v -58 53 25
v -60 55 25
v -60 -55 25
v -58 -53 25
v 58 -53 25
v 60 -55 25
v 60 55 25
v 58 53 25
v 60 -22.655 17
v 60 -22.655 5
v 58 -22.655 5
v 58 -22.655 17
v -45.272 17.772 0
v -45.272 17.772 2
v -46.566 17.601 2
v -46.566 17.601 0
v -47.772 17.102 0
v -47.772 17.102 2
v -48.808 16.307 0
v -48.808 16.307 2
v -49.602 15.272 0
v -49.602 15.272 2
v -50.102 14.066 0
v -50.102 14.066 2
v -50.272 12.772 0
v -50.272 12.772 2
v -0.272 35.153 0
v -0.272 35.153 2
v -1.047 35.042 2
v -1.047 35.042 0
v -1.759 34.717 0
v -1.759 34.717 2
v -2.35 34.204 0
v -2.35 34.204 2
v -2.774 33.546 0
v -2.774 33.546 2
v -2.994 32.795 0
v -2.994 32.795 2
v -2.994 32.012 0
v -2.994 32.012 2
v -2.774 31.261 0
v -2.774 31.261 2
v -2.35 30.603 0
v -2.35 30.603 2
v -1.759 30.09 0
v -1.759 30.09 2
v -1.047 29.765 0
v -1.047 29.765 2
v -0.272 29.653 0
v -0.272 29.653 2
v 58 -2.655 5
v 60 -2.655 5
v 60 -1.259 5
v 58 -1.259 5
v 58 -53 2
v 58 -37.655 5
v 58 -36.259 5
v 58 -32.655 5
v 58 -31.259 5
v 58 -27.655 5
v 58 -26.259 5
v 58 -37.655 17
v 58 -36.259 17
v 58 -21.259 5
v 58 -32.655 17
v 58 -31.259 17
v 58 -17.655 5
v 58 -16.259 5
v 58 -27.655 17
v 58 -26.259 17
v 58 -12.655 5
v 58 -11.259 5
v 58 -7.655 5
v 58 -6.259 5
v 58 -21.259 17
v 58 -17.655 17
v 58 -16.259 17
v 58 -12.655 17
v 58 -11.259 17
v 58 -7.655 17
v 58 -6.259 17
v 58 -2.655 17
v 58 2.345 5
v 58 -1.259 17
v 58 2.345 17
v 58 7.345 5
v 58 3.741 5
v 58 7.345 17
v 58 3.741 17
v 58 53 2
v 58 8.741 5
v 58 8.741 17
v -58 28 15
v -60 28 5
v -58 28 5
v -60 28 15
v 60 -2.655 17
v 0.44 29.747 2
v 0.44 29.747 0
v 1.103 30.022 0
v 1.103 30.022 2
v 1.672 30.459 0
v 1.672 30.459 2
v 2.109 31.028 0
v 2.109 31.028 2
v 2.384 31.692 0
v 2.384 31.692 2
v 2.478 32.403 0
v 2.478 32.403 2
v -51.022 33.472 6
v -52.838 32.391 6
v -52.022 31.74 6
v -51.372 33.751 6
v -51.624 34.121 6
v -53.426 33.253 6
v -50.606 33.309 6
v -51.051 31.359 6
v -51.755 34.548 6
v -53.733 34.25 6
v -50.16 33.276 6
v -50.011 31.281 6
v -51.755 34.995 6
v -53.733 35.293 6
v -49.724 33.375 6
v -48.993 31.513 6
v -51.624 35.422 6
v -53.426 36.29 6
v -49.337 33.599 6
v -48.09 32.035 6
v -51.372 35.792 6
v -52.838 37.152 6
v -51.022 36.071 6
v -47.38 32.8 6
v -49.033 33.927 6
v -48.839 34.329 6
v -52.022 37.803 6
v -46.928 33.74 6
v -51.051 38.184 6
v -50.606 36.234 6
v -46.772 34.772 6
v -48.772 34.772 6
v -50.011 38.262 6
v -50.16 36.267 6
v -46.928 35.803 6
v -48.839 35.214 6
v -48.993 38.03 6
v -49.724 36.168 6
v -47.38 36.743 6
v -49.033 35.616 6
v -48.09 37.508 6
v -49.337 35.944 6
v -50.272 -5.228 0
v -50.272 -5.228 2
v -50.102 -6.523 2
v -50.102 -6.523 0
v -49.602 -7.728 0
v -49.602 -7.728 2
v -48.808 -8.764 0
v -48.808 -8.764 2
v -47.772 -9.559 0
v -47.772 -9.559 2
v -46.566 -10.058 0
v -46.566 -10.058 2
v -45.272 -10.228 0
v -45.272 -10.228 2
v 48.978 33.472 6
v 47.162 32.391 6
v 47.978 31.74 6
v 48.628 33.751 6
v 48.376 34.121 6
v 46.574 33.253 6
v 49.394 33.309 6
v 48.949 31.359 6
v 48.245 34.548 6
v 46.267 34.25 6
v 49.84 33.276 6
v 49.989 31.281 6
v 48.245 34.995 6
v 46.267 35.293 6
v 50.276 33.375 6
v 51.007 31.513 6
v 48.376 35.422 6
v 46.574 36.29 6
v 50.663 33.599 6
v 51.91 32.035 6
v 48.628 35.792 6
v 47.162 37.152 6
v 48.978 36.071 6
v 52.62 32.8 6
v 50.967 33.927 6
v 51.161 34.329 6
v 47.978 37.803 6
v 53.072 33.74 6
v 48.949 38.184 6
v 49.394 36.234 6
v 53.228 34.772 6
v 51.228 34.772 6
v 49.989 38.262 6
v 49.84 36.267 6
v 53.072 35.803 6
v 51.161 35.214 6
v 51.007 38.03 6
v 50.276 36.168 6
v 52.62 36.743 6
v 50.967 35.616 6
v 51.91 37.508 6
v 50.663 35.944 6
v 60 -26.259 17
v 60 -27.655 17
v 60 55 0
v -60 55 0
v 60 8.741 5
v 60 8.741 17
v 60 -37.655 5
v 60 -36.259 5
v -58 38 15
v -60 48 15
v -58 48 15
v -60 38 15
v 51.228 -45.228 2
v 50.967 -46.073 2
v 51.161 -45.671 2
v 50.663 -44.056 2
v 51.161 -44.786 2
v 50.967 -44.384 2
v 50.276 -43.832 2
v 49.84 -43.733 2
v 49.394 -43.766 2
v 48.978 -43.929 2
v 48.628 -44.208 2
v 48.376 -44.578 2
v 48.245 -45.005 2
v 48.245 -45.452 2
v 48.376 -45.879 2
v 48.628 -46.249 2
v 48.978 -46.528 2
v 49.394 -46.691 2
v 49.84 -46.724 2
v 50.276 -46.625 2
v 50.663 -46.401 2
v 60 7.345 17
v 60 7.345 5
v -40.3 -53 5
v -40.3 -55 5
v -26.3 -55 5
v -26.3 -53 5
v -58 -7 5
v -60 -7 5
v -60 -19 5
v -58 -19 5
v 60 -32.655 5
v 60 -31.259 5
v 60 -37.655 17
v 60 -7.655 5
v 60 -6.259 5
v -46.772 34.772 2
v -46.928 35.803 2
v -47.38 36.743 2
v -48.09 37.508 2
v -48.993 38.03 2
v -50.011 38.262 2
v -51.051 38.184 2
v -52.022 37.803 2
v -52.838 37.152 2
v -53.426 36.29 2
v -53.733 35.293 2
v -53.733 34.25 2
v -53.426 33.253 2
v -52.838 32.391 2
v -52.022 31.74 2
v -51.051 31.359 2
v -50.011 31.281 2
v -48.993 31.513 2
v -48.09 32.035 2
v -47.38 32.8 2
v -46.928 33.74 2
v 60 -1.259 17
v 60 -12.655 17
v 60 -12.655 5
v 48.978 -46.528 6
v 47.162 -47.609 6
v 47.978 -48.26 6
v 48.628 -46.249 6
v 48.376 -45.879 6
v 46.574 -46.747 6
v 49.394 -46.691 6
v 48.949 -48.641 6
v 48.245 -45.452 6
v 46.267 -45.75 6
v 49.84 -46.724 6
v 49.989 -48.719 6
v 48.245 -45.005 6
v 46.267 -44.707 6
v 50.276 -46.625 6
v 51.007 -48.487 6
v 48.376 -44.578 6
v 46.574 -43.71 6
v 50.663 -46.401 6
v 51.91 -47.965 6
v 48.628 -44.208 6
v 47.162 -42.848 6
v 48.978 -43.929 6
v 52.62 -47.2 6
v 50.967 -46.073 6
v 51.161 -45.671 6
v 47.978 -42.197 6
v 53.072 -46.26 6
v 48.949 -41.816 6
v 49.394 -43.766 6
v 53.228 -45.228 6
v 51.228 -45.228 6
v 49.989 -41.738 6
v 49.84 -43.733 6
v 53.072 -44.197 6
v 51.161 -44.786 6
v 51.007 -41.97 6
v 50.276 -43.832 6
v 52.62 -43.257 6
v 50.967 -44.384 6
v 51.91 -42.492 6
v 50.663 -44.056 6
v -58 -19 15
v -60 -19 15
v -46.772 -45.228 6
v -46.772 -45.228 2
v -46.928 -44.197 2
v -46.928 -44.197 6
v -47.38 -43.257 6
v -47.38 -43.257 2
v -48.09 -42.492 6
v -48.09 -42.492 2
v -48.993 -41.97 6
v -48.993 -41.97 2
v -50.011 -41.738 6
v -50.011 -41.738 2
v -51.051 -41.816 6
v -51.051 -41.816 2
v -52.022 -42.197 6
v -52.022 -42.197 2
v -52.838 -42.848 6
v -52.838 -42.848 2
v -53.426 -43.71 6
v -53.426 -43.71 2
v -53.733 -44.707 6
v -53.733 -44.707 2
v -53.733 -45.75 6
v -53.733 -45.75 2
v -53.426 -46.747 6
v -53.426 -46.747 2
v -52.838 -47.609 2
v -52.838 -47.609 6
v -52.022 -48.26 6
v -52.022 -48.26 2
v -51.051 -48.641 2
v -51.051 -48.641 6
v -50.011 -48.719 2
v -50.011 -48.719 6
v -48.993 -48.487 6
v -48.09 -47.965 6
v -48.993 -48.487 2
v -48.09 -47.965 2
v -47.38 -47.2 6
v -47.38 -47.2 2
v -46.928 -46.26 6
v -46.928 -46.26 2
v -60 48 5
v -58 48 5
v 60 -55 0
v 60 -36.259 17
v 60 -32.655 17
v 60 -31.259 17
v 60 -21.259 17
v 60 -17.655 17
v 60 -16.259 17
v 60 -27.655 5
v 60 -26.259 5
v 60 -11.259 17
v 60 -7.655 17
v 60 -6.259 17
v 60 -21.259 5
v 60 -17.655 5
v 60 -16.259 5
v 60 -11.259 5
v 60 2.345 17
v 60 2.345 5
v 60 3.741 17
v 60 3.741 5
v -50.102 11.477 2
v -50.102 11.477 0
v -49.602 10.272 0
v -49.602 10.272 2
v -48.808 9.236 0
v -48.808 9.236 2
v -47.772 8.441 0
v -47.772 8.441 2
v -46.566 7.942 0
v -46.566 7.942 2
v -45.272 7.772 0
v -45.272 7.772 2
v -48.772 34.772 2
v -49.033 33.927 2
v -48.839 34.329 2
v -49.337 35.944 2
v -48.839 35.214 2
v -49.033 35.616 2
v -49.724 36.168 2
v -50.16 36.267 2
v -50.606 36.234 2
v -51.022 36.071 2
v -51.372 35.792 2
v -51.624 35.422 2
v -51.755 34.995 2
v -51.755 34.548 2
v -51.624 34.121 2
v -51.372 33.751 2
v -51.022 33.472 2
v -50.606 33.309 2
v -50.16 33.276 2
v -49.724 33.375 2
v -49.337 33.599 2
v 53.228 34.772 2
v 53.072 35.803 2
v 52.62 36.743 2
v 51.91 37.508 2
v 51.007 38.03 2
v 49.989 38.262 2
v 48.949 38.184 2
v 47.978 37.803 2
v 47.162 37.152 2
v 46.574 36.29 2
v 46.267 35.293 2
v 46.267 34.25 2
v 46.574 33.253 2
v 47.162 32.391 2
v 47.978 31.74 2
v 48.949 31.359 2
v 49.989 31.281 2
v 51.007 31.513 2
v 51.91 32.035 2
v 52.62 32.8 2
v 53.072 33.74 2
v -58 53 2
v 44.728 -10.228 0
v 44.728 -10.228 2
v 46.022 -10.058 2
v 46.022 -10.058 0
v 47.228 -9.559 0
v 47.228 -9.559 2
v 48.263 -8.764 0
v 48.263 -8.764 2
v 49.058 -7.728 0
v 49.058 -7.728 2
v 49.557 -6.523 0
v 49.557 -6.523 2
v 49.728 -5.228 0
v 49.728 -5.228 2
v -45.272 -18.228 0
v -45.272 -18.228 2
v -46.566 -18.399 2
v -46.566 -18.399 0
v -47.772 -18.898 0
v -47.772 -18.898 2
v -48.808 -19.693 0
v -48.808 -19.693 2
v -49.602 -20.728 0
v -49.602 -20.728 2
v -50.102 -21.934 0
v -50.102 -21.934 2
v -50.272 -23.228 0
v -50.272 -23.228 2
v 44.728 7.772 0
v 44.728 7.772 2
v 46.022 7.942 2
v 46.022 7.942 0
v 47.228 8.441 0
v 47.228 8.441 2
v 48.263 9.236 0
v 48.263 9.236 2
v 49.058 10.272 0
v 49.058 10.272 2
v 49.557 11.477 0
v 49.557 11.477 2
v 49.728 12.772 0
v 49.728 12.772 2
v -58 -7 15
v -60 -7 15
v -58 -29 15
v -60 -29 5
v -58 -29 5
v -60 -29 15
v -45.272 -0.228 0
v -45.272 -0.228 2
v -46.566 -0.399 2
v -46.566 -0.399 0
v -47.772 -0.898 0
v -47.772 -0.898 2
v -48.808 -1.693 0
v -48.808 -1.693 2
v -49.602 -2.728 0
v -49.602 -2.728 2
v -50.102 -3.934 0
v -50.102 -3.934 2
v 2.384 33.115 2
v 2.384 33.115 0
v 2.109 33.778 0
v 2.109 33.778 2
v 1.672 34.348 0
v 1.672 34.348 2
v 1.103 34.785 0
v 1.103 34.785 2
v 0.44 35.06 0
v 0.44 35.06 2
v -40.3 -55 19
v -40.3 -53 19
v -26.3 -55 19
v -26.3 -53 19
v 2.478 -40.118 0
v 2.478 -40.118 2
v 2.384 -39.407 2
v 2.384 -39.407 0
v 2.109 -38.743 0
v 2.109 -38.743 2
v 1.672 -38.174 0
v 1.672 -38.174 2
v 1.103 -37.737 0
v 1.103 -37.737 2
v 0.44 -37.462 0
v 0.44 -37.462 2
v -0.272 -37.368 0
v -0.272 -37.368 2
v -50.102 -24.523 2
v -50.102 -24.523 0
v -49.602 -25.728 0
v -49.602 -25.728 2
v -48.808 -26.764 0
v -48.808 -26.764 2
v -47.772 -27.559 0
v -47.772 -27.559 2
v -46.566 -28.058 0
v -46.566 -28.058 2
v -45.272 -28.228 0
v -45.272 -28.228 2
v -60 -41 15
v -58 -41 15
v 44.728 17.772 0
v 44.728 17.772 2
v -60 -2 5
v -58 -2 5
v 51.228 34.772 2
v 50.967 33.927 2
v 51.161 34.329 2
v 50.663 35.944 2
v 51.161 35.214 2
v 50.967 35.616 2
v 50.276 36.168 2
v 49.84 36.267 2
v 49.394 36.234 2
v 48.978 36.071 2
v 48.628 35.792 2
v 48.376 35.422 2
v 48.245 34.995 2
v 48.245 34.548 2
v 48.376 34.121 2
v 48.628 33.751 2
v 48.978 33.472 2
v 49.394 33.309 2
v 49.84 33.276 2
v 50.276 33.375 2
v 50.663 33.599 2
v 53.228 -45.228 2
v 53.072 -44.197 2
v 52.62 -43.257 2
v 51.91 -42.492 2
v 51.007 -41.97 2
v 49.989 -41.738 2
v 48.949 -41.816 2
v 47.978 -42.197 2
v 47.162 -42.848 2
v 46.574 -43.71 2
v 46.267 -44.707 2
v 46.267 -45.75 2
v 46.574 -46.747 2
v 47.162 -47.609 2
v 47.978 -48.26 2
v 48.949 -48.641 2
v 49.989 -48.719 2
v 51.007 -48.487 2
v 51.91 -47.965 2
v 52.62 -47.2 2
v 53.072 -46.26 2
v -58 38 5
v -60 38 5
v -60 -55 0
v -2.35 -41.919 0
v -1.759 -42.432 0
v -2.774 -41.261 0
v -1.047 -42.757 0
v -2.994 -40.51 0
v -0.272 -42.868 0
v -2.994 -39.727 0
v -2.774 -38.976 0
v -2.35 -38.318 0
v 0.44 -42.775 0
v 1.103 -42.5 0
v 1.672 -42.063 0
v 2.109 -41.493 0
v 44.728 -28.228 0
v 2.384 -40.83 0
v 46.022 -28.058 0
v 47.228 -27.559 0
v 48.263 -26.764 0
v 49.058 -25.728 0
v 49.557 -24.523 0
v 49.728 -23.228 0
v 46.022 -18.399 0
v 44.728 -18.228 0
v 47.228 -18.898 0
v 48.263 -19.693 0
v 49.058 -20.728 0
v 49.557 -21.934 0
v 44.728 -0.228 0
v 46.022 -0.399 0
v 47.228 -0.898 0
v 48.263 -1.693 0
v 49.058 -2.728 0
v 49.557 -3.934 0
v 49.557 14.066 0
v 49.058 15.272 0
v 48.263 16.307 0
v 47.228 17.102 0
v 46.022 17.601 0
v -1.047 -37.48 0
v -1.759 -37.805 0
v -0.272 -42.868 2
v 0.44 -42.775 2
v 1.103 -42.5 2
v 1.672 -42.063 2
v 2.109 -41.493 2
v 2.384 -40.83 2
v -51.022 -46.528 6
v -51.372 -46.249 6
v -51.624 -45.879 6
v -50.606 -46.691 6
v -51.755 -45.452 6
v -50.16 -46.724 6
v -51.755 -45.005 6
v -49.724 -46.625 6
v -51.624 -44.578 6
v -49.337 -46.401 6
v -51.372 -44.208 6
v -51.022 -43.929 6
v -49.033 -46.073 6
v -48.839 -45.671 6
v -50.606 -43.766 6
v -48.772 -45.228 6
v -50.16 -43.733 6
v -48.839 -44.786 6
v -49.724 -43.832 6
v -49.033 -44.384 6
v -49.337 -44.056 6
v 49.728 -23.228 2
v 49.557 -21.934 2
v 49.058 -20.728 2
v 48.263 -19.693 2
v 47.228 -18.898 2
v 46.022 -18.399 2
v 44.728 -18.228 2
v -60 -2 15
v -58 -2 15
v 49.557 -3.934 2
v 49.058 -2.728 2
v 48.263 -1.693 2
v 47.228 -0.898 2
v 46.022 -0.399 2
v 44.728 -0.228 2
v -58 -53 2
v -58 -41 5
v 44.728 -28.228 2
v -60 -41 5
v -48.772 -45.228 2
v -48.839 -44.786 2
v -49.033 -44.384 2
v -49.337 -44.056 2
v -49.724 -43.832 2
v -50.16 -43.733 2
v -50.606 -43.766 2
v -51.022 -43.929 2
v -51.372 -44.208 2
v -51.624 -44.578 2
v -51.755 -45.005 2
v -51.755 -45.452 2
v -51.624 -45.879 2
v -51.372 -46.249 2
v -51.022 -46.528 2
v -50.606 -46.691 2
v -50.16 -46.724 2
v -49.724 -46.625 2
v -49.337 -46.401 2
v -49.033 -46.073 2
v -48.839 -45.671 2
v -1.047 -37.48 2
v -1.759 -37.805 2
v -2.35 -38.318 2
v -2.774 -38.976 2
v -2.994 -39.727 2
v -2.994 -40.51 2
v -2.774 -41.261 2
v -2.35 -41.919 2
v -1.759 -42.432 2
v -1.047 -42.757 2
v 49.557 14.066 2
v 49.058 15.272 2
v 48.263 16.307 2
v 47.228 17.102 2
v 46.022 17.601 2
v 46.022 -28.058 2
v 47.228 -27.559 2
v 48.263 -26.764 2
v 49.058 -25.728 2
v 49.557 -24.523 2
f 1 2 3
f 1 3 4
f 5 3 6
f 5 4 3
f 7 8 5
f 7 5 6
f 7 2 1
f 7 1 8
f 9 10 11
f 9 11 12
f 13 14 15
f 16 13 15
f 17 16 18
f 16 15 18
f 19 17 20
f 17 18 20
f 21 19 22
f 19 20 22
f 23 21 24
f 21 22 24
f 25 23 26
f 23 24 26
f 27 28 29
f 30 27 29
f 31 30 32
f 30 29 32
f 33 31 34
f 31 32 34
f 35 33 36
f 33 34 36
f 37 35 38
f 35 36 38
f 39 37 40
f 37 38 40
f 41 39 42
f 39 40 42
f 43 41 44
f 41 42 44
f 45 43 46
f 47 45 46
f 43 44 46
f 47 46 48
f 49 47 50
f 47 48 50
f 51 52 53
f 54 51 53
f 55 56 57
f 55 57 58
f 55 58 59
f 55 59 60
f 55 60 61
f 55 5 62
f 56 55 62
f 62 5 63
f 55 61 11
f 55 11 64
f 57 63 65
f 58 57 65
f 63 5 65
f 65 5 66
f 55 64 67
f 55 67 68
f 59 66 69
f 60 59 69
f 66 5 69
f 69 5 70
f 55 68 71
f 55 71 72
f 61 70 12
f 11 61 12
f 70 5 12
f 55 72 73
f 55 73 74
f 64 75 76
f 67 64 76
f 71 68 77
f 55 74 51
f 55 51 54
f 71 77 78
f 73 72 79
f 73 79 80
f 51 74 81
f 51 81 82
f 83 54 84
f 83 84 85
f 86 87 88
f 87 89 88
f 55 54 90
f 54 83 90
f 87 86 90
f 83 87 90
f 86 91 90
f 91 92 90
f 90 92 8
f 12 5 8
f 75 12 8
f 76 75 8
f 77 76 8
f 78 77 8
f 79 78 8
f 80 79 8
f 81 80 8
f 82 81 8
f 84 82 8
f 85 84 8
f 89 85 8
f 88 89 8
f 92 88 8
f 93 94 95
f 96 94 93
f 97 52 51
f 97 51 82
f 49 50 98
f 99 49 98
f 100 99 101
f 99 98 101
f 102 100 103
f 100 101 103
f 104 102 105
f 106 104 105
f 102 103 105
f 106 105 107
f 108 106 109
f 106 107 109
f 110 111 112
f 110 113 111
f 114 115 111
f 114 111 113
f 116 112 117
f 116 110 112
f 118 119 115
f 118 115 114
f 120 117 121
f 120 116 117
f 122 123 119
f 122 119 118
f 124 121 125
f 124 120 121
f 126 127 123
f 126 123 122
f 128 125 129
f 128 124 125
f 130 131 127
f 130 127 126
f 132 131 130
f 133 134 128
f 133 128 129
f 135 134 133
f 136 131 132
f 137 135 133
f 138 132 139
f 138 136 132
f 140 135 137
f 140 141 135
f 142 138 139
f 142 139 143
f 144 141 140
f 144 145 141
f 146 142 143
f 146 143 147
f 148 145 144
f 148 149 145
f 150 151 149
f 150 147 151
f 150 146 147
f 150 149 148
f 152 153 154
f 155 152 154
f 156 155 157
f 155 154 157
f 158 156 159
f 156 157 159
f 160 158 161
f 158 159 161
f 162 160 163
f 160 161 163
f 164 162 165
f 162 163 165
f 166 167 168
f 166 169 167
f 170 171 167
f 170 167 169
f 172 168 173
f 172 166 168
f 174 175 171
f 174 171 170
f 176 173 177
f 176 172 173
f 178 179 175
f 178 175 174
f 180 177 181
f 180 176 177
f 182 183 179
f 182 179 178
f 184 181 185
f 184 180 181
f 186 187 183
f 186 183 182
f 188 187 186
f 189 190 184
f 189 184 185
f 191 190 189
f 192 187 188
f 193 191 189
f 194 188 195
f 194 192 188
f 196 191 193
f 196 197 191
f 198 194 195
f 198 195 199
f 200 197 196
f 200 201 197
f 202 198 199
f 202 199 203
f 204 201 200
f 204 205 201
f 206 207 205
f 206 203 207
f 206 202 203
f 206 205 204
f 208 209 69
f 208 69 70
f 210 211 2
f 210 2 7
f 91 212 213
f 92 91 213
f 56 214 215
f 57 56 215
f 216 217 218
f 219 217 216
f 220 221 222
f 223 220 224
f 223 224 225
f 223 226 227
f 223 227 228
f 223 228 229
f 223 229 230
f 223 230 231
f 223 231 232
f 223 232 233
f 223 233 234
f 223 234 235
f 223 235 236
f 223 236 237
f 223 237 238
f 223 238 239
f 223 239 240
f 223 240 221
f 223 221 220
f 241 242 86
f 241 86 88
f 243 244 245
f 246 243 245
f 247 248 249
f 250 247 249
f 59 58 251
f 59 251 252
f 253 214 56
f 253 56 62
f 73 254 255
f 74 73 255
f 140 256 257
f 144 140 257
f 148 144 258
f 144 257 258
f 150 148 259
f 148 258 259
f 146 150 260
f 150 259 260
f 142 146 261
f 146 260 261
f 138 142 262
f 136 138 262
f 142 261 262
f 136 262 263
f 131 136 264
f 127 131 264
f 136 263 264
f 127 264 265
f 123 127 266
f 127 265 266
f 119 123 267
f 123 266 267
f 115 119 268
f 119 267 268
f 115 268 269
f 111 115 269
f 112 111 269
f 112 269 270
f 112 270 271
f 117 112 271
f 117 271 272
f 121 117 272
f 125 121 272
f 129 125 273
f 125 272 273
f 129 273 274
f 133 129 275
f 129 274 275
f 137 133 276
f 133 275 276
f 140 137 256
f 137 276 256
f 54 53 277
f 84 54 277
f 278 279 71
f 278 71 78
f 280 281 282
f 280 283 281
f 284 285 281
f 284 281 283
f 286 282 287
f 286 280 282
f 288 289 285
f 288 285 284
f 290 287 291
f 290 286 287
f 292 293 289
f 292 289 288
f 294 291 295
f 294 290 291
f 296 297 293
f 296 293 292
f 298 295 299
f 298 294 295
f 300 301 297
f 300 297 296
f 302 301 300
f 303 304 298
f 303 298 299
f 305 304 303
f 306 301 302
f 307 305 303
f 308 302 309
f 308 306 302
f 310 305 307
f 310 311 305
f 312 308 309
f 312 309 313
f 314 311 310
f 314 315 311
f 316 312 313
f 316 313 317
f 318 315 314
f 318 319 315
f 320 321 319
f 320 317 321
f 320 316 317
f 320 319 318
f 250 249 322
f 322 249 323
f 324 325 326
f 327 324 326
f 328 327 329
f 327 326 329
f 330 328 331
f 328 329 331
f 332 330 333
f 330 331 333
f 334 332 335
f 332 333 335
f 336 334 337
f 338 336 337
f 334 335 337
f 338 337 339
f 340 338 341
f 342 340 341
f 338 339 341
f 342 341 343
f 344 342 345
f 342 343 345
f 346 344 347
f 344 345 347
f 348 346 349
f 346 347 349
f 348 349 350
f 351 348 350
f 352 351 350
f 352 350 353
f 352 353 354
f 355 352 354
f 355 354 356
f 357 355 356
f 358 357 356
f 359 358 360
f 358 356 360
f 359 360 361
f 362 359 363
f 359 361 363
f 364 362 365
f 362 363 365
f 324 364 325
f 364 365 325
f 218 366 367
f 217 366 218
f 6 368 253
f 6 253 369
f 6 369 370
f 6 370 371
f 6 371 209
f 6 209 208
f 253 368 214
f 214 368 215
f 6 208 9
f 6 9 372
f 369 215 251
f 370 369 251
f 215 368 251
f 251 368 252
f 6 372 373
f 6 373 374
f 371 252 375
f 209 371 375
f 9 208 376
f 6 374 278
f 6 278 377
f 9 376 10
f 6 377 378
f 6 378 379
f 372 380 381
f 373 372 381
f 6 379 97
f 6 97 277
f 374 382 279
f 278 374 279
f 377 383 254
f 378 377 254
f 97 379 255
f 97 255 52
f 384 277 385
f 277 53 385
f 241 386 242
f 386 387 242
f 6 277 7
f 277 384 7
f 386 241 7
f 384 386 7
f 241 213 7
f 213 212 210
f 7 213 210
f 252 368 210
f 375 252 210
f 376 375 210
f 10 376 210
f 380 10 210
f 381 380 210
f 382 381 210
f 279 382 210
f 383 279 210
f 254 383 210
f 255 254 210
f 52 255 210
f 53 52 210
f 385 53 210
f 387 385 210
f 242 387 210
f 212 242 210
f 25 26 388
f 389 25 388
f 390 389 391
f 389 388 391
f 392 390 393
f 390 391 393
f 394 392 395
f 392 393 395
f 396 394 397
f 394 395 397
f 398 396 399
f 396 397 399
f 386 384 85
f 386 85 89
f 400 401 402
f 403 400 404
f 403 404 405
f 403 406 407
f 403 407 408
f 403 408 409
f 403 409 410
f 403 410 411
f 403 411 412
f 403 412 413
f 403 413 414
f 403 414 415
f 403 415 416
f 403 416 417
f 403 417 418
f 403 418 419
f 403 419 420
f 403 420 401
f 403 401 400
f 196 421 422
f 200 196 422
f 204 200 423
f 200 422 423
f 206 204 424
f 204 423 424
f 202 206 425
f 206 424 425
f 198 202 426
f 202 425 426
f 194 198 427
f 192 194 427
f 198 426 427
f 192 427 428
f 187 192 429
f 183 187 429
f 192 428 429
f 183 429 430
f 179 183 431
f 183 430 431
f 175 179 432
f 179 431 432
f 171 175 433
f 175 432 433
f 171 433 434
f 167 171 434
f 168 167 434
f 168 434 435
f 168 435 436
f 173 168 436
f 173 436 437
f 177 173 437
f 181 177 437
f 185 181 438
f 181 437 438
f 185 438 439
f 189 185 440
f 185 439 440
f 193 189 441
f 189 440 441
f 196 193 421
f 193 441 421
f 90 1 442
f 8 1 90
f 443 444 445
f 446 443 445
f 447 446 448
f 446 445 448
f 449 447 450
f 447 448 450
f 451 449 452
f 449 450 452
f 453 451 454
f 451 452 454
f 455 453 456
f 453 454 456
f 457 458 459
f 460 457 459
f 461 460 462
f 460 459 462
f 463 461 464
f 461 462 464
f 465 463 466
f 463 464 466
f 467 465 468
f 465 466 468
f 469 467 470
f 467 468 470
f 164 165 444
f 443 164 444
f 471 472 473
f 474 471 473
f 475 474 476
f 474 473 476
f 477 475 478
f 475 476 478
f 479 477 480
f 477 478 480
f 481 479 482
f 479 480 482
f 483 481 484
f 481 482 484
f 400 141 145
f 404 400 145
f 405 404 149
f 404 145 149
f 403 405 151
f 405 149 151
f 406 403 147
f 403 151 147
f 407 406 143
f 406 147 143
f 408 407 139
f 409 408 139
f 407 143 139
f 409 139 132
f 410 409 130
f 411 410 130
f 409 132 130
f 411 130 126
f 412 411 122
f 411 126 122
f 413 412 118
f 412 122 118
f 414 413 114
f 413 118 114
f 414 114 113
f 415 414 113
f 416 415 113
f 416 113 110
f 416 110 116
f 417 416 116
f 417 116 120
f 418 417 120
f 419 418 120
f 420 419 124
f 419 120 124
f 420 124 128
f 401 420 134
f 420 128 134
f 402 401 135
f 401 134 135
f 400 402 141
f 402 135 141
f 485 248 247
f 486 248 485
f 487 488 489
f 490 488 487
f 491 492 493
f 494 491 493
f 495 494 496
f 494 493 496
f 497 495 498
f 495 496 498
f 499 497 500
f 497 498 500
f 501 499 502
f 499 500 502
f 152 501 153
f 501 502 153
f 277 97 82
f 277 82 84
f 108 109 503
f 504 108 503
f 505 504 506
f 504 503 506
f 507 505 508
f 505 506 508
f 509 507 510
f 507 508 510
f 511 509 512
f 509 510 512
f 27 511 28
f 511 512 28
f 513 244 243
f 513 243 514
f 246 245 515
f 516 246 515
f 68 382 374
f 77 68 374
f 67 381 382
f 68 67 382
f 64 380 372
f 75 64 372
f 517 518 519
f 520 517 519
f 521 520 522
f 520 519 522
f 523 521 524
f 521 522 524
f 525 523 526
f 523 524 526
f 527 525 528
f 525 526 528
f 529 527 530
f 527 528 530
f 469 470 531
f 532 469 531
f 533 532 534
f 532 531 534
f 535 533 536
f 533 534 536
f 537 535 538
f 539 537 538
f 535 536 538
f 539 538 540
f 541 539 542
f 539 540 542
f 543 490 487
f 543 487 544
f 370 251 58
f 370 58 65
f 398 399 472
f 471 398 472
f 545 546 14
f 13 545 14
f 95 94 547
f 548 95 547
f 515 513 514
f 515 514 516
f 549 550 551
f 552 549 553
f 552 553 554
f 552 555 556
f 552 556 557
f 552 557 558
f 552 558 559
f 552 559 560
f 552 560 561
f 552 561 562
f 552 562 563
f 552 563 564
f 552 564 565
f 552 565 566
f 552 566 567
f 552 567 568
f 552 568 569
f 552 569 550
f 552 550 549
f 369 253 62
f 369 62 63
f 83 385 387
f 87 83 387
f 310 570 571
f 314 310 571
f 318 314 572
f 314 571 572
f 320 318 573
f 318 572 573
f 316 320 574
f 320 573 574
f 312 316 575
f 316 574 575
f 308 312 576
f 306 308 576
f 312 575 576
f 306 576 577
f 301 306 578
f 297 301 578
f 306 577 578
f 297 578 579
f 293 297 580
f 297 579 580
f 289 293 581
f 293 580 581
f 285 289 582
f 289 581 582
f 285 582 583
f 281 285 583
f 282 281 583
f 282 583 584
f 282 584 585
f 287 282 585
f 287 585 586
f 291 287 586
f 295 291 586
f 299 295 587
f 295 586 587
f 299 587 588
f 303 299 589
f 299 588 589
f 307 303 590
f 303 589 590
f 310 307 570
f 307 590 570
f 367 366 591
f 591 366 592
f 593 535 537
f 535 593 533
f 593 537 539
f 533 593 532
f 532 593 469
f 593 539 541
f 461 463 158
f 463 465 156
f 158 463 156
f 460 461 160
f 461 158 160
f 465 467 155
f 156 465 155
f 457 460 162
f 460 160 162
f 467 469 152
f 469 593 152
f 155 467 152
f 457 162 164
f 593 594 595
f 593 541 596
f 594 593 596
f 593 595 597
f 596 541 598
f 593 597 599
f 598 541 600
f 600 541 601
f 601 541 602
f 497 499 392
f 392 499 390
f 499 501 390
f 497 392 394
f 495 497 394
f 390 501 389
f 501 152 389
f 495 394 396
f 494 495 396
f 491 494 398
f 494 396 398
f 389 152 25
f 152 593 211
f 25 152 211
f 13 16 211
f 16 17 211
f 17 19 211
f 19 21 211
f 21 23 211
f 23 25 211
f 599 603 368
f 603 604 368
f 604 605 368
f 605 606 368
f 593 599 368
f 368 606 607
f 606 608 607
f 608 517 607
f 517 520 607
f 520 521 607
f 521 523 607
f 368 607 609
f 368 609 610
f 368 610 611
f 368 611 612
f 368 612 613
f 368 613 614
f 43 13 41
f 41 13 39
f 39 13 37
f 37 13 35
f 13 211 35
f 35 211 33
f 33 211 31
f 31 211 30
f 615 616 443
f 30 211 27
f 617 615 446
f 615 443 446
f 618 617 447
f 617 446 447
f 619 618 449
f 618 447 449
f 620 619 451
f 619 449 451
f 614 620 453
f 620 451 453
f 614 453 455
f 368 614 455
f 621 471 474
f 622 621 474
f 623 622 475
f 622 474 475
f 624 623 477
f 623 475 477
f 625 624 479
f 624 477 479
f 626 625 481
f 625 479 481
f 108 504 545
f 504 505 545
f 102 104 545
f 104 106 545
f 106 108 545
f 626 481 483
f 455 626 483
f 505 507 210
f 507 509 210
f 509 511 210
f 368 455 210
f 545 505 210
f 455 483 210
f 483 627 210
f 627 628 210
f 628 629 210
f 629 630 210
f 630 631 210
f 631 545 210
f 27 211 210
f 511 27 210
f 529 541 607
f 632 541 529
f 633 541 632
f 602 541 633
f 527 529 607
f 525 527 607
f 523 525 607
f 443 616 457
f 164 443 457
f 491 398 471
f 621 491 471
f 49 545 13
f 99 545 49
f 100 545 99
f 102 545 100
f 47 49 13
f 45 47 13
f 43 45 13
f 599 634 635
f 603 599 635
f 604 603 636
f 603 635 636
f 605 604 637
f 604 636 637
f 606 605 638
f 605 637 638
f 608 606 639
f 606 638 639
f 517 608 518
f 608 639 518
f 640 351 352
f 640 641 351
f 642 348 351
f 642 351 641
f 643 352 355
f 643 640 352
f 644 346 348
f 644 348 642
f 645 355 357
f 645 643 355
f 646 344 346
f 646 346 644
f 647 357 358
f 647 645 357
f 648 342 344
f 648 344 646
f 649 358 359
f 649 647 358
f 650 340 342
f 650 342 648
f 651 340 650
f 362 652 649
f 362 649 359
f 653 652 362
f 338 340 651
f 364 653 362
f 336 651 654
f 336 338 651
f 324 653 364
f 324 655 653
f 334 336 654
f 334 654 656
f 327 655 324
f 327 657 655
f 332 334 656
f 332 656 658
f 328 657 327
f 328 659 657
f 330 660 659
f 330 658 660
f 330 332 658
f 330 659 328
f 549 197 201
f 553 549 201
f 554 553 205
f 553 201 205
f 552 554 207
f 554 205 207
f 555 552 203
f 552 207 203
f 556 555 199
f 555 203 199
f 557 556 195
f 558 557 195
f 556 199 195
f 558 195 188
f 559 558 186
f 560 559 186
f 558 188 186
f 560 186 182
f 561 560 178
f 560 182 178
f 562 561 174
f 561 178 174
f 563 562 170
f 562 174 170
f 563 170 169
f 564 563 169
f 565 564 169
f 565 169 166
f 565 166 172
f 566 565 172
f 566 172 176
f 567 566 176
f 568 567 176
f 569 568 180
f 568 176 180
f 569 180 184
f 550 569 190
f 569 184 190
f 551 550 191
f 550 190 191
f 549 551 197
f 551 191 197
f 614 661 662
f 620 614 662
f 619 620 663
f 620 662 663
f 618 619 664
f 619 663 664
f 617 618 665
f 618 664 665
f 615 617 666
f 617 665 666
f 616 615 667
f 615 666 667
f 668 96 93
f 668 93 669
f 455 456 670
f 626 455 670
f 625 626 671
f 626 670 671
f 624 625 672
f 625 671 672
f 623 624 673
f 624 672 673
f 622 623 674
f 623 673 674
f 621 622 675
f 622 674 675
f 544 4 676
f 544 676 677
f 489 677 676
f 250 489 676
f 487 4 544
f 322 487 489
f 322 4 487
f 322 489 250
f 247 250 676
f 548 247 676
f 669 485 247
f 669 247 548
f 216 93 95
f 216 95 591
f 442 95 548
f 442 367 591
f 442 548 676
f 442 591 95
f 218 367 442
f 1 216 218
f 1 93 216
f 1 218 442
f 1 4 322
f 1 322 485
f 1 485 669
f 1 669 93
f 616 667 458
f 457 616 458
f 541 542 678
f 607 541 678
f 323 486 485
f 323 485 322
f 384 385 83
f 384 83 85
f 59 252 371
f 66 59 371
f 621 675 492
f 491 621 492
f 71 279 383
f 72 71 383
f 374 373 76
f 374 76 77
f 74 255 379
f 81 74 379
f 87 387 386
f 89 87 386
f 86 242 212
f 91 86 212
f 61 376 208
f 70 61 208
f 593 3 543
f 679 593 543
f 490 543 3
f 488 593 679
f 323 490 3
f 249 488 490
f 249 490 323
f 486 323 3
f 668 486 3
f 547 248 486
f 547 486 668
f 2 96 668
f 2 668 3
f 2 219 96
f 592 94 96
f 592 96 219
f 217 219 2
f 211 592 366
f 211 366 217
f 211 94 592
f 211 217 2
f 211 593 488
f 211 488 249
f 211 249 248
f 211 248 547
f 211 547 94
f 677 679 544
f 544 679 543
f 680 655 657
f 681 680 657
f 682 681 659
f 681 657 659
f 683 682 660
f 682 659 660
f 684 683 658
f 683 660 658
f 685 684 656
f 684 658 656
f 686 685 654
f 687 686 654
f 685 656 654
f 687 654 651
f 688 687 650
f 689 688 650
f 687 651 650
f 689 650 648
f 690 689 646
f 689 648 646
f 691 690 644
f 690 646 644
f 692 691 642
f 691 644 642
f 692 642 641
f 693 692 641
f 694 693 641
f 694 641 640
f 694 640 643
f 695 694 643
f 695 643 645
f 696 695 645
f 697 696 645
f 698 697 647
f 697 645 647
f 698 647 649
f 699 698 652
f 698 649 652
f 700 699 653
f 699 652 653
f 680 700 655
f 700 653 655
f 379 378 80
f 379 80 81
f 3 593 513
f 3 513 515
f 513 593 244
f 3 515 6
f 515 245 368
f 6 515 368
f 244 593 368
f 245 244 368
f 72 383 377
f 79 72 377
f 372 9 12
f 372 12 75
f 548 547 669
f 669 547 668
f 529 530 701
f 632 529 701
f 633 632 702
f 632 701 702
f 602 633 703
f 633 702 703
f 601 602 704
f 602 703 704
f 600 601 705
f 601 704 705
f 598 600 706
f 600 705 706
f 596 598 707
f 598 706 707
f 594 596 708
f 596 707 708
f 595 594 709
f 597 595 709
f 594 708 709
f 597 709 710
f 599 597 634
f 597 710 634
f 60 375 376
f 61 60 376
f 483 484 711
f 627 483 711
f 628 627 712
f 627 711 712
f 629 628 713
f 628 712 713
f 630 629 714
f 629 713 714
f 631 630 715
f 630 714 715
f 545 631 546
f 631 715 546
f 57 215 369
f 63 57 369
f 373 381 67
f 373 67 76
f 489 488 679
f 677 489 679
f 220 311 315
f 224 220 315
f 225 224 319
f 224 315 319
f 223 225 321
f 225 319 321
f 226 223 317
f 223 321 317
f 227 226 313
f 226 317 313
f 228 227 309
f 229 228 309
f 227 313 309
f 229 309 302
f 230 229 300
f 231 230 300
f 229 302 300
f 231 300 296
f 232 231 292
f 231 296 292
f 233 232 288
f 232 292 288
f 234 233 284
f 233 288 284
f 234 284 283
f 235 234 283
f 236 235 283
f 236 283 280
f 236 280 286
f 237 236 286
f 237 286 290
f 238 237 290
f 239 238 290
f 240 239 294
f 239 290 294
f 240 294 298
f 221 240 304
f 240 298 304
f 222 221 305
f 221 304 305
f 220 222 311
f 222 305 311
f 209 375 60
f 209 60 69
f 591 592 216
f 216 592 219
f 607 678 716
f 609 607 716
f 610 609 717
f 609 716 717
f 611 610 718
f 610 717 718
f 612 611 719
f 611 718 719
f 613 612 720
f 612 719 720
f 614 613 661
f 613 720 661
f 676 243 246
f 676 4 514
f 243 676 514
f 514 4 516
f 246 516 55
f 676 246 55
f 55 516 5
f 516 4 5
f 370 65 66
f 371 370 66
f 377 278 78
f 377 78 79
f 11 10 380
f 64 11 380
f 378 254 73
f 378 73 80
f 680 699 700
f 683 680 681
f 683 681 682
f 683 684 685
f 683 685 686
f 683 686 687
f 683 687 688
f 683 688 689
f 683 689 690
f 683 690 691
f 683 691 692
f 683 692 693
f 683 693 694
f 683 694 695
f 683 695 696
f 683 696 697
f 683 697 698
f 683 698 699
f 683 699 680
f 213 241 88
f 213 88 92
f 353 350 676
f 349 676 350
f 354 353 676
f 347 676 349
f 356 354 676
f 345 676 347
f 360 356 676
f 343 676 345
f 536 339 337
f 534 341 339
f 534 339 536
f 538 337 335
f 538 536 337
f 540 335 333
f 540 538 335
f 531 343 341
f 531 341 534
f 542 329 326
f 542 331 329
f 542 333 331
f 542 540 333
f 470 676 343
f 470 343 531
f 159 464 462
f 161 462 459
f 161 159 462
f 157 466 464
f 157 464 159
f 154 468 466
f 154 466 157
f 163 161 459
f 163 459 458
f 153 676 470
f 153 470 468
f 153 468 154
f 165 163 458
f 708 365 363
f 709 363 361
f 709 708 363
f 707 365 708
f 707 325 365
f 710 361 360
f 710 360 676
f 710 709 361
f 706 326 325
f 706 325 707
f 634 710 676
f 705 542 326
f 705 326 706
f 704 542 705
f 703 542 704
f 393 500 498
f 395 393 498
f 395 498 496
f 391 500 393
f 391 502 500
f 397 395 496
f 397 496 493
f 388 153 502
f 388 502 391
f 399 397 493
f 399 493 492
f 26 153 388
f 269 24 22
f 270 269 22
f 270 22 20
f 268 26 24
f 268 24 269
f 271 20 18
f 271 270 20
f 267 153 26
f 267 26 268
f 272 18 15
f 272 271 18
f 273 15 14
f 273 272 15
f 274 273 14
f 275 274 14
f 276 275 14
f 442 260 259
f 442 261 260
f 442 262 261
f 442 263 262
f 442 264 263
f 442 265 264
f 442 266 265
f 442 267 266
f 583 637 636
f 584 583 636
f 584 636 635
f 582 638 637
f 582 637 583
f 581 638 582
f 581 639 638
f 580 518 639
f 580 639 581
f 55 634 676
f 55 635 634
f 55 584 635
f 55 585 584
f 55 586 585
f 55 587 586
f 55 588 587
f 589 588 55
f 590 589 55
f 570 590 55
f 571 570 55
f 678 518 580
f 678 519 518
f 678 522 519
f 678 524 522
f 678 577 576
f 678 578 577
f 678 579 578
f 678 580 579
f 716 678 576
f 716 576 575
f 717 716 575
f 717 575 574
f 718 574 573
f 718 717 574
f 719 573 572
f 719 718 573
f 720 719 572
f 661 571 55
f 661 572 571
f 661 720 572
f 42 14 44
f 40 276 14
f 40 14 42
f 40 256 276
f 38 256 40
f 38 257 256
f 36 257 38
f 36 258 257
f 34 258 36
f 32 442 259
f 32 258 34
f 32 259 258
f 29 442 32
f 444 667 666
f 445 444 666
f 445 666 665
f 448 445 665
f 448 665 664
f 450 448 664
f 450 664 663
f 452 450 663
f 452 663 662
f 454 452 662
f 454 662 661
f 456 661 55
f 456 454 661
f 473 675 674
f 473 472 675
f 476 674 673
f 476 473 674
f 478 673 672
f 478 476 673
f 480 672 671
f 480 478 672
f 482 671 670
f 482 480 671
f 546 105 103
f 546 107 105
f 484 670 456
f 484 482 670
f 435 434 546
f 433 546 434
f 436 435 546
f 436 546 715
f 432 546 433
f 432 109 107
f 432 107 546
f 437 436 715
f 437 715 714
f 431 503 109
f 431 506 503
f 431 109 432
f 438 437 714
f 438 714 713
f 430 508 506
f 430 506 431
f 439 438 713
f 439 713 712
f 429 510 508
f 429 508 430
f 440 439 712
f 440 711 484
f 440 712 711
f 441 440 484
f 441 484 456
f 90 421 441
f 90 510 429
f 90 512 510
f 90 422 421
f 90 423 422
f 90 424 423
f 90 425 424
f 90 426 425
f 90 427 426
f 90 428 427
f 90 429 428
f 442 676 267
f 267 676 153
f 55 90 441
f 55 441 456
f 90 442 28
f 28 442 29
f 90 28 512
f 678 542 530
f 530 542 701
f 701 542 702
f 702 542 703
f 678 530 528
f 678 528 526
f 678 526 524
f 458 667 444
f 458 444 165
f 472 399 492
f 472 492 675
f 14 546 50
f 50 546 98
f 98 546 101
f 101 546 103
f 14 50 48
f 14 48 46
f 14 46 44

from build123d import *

# Parameters (mm, degrees)
F0_W      = 120
F0_H      = 110
F1_DEPTH  = 25
F2_W      = 116
F2_H      = 106
F3_DEPTH  = 23
F4_R      = 3.5
F5_DEPTH  = 4
F6_R      = 1.5
F7_DEPTH  = 4
F8_R      = 1.5
F9_DEPTH  = 4
F10_R     = 1.5
F11_DEPTH = 4
F12_R     = 1.5
F13_DEPTH = 4
F14_W     = 14
F14_H     = 14
F15_DEPTH = 5
F16_W     = 12
F16_H     = 10
F16_W_2   = 30
F16_W_3   = 10
F17_DEPTH = 2
F18_DEPTH = 25
F19_DEPTH = 25
F20_DEPTH = 25
F21_DEPTH = 25
F22_W     = 1.3961357757
F22_H     = 12
F23_DEPTH = 25


with BuildPart() as f1:
    # F0 (on Top) → F1 (new body)
    with BuildSketch(Plane.XY):
        Rectangle(F0_W, F0_H)
    extrude(amount=F1_DEPTH)

    # F2 (on face) → F3 (cut)
    with BuildSketch(Plane.XY.offset(25)):
        Rectangle(F2_W, F2_H)
    extrude(amount=-F3_DEPTH, mode=Mode.SUBTRACT)

    # F4 (on face) → F5 (join)
    with BuildSketch(Plane.XY.offset(2)):
        with Locations((-50.2721771598, 34.7715031275)):
            Circle(F4_R)
        with Locations((49.7278228402, 34.7715031275)):
            Circle(F4_R)
        with Locations((49.7278228402, -45.2284968725)):
            Circle(F4_R)
        with Locations((-50.2721771598, -45.2284968725)):
            Circle(F4_R)
    extrude(amount=F5_DEPTH)

    # F6 (on face) → F7 (cut)
    with BuildSketch(Plane.XY.offset(6)):
        with Locations((-50.2721771598, 34.7715031275)):
            Circle(F6_R)
    extrude(amount=-F7_DEPTH, mode=Mode.SUBTRACT)

    # F8 (on face) → F9 (cut)
    with BuildSketch(Plane.XY.offset(6)):
        with Locations((49.7278228402, 34.7715031275)):
            Circle(F8_R)
    extrude(amount=-F9_DEPTH, mode=Mode.SUBTRACT)

    # F10 (on face) → F11 (cut)
    with BuildSketch(Plane.XY.offset(6)):
        with Locations((49.7278228402, -45.2284968725)):
            Circle(F10_R)
    extrude(amount=-F11_DEPTH, mode=Mode.SUBTRACT)

    # F12 (on face) → F13 (cut)
    with BuildSketch(Plane.XY.offset(6)):
        with Locations((-50.2721771598, -45.2284968725)):
            Circle(F12_R)
    extrude(amount=-F13_DEPTH, mode=Mode.SUBTRACT)

    # F14 (on face) → F15 (cut)
    with BuildSketch(Plane.XZ.offset(55)):
        with Locations((-33.3, 12)):
            Rectangle(F14_W, F14_H)
    extrude(amount=-F15_DEPTH, mode=Mode.SUBTRACT)

    # F16 (on face) → F17 (cut)
    with BuildSketch(Plane(origin=(-60, 0, 0), x_dir=(0, -1, 0), z_dir=(-1, 0, 0))):
        with Locations((35, 10)):
            Rectangle(F16_W, F16_H)
        with Locations((13, 10)):
            Rectangle(F16_W, F16_H)
        with Locations((-13, 10)):
            Rectangle(F16_W_2, F16_H)
        with Locations((-43, 10)):
            Rectangle(F16_W_3, F16_H)
    extrude(amount=-F17_DEPTH, mode=Mode.SUBTRACT)

    # F4 (on face) → F18 (cut)
    with BuildSketch(Plane.XY.offset(2)):
        with BuildLine():
            Line((-45.2721779048, 7.7715031275), (-0.2721771598, 7.7715031275))
            Line((-0.2721771598, 7.7715031275), (-0.2721771598, 17.7715031275))
            Line((-0.2721771598, 17.7715031275), (-45.2721779048, 17.7715031275))
            ThreePointArc((-45.2721779048, 17.7715031275), (-48.8077118108, 16.3070370335), (-50.2721779048, 12.7715031275))
            ThreePointArc((-50.2721779048, 12.7715031275), (-48.8077118108, 9.2359692216), (-45.2721779048, 7.7715031275))
        make_face()
        with BuildLine():
            Line((-0.2721771598, 17.7715031275), (-0.2721771598, 7.7715031275))
            Line((-0.2721771598, 7.7715031275), (44.7278220952, 7.7715031275))
            ThreePointArc((44.7278220952, 7.7715031275), (48.2633560011, 9.2359692216), (49.7278220952, 12.7715031275))
            ThreePointArc((49.7278220952, 12.7715031275), (48.2633560011, 16.3070370335), (44.7278220952, 17.7715031275))
            Line((44.7278220952, 17.7715031275), (-0.2721771598, 17.7715031275))
        make_face()
    extrude(amount=-F18_DEPTH, mode=Mode.SUBTRACT)

    # F4 (on face) → F19 (cut)
    with BuildSketch(Plane.XY.offset(2)):
        with BuildLine():
            Line((-0.2721771598, -18.2284968725), (-0.2721771598, -28.2284968725))
            Line((-0.2721771598, -28.2284968725), (44.7278220952, -28.2284968725))
            ThreePointArc((44.7278220952, -28.2284968725), (48.2633560011, -26.7640307784), (49.7278220952, -23.2284968725))
            ThreePointArc((49.7278220952, -23.2284968725), (48.2633560011, -19.6929629665), (44.7278220952, -18.2284968725))
            Line((44.7278220952, -18.2284968725), (-0.2721771598, -18.2284968725))
        make_face()
        with BuildLine():
            Line((49.7278228402, -5.2284968725), (-0.2721771598, -5.2284968725))
            Line((-0.2721771598, -5.2284968725), (-0.2721771598, -10.2284968725))
            Line((-0.2721771598, -10.2284968725), (44.7278228402, -10.2284968725))
            ThreePointArc((44.7278228402, -10.2284968725), (48.2633567461, -8.7640307784), (49.7278228402, -5.2284968725))
        make_face()
        with BuildLine():
            ThreePointArc((-45.2721771598, -0.2284968725), (-48.8077110657, -1.6929629665), (-50.2721771598, -5.2284968725))
            Line((-50.2721771598, -5.2284968725), (-0.2721771598, -5.2284968725))
            Line((-0.2721771598, -5.2284968725), (-0.2721771598, -0.2284968725))
            Line((-0.2721771598, -0.2284968725), (-45.2721771598, -0.2284968725))
        make_face()
        with BuildLine():
            Line((-0.2721771598, -5.2284968725), (-50.2721771598, -5.2284968725))
            ThreePointArc((-50.2721771598, -5.2284968725), (-48.8077110657, -8.7640307784), (-45.2721771598, -10.2284968725))
            Line((-45.2721771598, -10.2284968725), (-0.2721771598, -10.2284968725))
            Line((-0.2721771598, -10.2284968725), (-0.2721771598, -5.2284968725))
        make_face()
        with BuildLine():
            Line((-45.2721779048, -28.2284968725), (-0.2721771598, -28.2284968725))
            Line((-0.2721771598, -28.2284968725), (-0.2721771598, -18.2284968725))
            Line((-0.2721771598, -18.2284968725), (-45.2721779048, -18.2284968725))
            ThreePointArc((-45.2721779048, -18.2284968725), (-48.8077118108, -19.6929629665), (-50.2721779048, -23.2284968725))
            ThreePointArc((-50.2721779048, -23.2284968725), (-48.8077118108, -26.7640307784), (-45.2721779048, -28.2284968725))
        make_face()
        with BuildLine():
            Line((-0.2721771598, -0.2284968725), (-0.2721771598, -5.2284968725))
            Line((-0.2721771598, -5.2284968725), (49.7278228402, -5.2284968725))
            ThreePointArc((49.7278228402, -5.2284968725), (48.2633567461, -1.6929629665), (44.7278228402, -0.2284968725))
            Line((44.7278228402, -0.2284968725), (-0.2721771598, -0.2284968725))
        make_face()
    extrude(amount=-F19_DEPTH, mode=Mode.SUBTRACT)

    # F4 (on face) → F20 (cut)
    with BuildSketch(Plane.XY.offset(2)):
        with BuildLine():
            ThreePointArc((2.4778228402, 32.4033908546), (1.6723664885, 34.3479345029), (-0.2721771598, 35.1533908546))
            Line((-0.2721771598, 35.1533908546), (-0.2721771598, 29.6533908546))
            ThreePointArc((-0.2721771598, 29.6533908546), (1.6723664885, 30.4588472063), (2.4778228402, 32.4033908546))
        make_face()
        with BuildLine():
            Line((-0.2721771598, 29.6533908546), (-0.2721771598, 35.1533908546))
            ThreePointArc((-0.2721771598, 35.1533908546), (-3.0221771598, 32.4033908546), (-0.2721771598, 29.6533908546))
        make_face()
    extrude(amount=-F20_DEPTH, mode=Mode.SUBTRACT)

    # F4 (on face) → F21 (cut)
    with BuildSketch(Plane.XY.offset(2)):
        with BuildLine():
            Line((-0.2721771598, -37.3684372604), (-0.2721771598, -42.8684372604))
            ThreePointArc((-0.2721771598, -42.8684372604), (1.6723664885, -42.0629809087), (2.4778228402, -40.1184372604))
            ThreePointArc((2.4778228402, -40.1184372604), (1.6723664885, -38.1738936121), (-0.2721771598, -37.3684372604))
        make_face()
        with BuildLine():
            ThreePointArc((-0.2721771598, -37.3684372604), (-3.0221771598, -40.1184372604), (-0.2721771598, -42.8684372604))
            Line((-0.2721771598, -42.8684372604), (-0.2721771598, -37.3684372604))
        make_face()
    extrude(amount=-F21_DEPTH, mode=Mode.SUBTRACT)

    # F22 (on face) → F23 (cut)
    with BuildSketch(Plane.YZ.offset(60)):
        with Locations((8.0433619022, 11)):
            Rectangle(F22_W, F22_H)
        with Locations((3.0433619022, 11)):
            Rectangle(F22_W, F22_H)
        with Locations((-1.9566380978, 11)):
            Rectangle(F22_W, F22_H)
        with Locations((-6.9566380978, 11)):
            Rectangle(F22_W, F22_H)
        with Locations((-11.9566380978, 11)):
            Rectangle(F22_W, F22_H)
        with Locations((-16.9566380978, 11)):
            Rectangle(F22_W, F22_H)
        with Locations((-21.9566380978, 11)):
            Rectangle(F22_W, F22_H)
        with Locations((-26.9566380978, 11)):
            Rectangle(F22_W, F22_H)
        with Locations((-31.9566380978, 11)):
            Rectangle(F22_W, F22_H)
        with Locations((-36.9566380978, 11)):
            Rectangle(F22_W, F22_H)
    extrude(amount=-F23_DEPTH, mode=Mode.SUBTRACT)


solid = f1.part
